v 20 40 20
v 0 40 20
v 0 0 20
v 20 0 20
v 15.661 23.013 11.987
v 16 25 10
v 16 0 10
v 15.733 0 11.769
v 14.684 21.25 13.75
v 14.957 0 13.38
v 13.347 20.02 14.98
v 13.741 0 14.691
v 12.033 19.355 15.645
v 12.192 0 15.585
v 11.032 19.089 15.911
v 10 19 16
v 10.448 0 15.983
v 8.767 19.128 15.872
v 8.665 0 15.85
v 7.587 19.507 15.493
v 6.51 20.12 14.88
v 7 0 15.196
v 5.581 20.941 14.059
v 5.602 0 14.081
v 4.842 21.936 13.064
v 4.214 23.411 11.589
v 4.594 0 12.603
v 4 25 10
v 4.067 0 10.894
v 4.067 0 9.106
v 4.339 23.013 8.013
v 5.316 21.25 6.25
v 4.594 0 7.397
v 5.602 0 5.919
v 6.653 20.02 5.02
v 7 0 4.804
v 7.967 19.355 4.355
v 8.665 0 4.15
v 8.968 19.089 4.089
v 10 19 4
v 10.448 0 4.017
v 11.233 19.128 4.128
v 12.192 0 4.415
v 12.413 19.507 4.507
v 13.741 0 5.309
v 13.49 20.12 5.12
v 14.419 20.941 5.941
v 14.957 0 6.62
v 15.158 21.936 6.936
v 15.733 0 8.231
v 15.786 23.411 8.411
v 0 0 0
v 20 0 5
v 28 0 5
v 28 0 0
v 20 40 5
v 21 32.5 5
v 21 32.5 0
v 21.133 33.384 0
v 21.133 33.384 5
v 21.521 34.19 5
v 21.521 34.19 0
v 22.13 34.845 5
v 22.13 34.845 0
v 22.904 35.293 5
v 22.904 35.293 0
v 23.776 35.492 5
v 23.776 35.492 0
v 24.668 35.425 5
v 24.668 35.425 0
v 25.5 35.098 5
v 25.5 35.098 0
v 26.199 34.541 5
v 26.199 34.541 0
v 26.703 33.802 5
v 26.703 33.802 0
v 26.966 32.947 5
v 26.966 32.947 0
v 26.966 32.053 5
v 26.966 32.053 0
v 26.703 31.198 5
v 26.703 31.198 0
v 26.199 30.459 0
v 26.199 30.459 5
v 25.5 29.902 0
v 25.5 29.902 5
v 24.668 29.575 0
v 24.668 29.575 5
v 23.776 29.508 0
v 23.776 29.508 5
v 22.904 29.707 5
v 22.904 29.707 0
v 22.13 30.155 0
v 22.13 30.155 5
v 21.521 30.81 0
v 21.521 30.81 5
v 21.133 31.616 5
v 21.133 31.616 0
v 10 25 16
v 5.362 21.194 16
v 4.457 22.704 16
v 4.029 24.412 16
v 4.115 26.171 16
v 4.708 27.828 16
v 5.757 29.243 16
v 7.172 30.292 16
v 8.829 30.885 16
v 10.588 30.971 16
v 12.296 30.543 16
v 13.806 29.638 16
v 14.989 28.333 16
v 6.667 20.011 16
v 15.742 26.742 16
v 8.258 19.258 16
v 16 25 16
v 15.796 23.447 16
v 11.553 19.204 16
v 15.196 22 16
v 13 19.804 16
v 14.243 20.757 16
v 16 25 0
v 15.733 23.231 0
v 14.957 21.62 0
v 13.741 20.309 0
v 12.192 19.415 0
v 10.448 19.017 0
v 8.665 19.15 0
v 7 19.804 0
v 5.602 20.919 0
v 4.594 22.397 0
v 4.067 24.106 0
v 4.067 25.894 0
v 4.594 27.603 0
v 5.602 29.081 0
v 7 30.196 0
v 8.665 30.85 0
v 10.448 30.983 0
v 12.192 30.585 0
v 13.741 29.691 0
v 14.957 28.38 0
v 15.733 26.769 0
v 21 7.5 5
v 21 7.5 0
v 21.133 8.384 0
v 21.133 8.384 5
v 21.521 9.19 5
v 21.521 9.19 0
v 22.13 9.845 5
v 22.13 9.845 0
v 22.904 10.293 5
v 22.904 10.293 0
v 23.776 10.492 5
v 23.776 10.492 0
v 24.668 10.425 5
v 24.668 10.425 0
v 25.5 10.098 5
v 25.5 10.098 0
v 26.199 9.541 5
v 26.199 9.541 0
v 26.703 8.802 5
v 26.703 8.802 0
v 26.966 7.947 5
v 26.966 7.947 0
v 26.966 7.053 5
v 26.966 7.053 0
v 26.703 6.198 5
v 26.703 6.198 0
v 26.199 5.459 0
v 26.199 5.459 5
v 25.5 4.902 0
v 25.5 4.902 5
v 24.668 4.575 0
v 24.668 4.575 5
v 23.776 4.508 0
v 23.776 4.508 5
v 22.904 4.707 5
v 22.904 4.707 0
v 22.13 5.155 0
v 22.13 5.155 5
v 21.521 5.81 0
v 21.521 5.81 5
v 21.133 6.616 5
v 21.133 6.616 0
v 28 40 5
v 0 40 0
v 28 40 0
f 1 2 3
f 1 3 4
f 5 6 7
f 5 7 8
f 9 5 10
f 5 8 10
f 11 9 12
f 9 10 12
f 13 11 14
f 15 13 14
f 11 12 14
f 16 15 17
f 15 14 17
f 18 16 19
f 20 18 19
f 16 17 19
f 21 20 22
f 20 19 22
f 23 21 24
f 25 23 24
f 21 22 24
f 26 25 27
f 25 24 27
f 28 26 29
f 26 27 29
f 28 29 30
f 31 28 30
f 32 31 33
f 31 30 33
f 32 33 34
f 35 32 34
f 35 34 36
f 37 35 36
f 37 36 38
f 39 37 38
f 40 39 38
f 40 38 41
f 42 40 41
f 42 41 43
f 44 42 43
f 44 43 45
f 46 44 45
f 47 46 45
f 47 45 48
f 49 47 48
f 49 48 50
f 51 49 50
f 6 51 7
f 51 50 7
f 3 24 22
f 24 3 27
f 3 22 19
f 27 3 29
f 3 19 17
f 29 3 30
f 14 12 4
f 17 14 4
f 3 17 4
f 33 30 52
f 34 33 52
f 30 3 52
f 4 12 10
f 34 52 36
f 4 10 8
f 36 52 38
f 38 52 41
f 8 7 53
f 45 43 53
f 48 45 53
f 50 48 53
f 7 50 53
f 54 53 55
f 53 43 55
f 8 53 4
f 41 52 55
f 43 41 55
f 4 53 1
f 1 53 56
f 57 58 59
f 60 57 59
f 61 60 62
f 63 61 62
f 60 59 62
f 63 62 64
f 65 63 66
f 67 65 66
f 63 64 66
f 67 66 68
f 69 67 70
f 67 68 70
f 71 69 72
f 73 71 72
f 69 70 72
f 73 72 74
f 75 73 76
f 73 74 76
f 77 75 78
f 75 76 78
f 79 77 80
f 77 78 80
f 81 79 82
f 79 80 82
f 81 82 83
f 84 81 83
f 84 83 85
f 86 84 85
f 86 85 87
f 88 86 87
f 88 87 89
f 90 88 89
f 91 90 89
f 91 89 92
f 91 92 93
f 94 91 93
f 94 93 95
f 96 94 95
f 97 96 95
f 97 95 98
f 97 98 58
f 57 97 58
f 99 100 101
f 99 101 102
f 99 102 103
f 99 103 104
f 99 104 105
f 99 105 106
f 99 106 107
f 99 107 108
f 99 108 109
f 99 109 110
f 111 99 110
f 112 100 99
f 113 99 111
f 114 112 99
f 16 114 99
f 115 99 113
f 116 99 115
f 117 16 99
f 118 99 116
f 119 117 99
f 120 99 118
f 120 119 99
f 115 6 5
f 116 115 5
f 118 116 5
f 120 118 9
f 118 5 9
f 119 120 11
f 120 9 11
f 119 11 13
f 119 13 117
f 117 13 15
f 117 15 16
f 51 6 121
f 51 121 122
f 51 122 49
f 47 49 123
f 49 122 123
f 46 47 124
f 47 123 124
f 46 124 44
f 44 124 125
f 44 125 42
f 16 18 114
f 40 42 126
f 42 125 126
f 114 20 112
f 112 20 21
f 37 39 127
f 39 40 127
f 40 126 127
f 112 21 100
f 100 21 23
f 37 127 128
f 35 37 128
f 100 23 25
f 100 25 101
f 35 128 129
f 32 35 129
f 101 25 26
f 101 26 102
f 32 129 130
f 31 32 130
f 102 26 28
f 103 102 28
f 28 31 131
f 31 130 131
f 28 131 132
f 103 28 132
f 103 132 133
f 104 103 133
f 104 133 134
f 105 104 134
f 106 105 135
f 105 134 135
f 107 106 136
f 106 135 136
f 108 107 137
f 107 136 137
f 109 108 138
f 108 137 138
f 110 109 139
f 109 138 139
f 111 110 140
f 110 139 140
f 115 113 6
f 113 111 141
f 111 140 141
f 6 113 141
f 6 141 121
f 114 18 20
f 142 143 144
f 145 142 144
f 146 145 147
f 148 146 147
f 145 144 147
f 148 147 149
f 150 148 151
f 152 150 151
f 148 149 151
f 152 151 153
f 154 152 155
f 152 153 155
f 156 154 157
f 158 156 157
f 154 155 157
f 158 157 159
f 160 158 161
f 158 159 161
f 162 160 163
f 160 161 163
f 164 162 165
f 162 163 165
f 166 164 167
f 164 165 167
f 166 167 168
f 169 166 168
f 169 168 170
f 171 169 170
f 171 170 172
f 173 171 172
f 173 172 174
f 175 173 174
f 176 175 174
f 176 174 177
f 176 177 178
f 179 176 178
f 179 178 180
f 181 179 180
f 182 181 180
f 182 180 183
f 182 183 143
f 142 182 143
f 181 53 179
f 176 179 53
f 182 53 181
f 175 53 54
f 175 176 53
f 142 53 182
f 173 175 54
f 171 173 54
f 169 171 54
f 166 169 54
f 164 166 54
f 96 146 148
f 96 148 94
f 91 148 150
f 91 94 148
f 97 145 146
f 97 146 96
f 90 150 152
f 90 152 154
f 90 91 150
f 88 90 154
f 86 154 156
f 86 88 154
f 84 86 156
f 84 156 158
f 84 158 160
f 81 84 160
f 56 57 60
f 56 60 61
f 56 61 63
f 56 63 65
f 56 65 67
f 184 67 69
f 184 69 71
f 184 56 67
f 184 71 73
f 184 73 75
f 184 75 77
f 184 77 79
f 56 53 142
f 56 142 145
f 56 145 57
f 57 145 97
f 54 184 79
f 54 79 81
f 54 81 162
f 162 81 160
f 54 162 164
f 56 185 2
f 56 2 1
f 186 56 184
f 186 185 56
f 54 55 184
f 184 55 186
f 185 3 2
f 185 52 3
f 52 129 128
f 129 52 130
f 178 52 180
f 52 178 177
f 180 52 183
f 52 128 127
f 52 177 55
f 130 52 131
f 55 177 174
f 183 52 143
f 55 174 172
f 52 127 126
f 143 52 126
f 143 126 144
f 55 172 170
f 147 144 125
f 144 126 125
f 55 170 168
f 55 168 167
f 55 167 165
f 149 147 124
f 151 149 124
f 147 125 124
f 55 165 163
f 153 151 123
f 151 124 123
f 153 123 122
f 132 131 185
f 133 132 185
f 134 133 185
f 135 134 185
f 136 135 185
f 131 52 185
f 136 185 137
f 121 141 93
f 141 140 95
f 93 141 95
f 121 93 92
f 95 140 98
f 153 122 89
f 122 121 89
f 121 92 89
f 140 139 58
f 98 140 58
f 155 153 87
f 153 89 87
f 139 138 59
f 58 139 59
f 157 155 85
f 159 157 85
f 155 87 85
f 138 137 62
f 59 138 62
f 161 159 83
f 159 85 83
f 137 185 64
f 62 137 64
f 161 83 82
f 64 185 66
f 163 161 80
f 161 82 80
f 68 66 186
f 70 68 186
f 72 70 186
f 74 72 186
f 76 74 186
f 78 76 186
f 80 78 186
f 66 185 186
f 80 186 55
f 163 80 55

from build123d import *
from build123d import SkipClean  # not in build123d's __all__

# Parameters (mm, degrees)
F0_W     = 28
F0_H     = 40
F1_DEPTH = 5
F2_W     = 20
F2_H     = 40
F3_DEPTH = 15
F6_D     = 6
F4_R     = 6
F7_DEPTH = 25
F8_R     = 6
F9_DEPTH = 16


with BuildPart() as f1:
    # F0 (on Top) → F1 (new body)
    with BuildSketch(Plane.XY):
        with Locations((14, 20)):
            Rectangle(F0_W, F0_H)
    extrude(amount=F1_DEPTH)

    # F2 (on face) → F3 (join)
    with BuildSketch(Plane.XY.offset(5)):
        with Locations((10, 20)):
            Rectangle(F2_W, F2_H)
    extrude(amount=F3_DEPTH)

    # F6 (through all)
    with Locations(Plane.XY.offset(5)):
        with Locations((24, 32.5), (24, 7.5)):
            Hole(F6_D / 2)

    # F4 (on face) → F7 (cut)
    with BuildSketch(Plane.XZ):
        with Locations((10, 10)):
            Circle(F4_R)
    extrude(amount=-F7_DEPTH, mode=Mode.SUBTRACT)

    # F8 (on face) → F9 (cut)
    with BuildSketch(Plane(origin=(0, 0, 0), x_dir=(1, 0, 0), z_dir=(0, 0, -1))):
        with Locations((10, -25)):
            Circle(F8_R)
    with SkipClean():  # cleaning this boolean's faces spoils the solid; the shape is the same uncleaned
        extrude(amount=-F9_DEPTH, mode=Mode.SUBTRACT)


solid = f1.part
